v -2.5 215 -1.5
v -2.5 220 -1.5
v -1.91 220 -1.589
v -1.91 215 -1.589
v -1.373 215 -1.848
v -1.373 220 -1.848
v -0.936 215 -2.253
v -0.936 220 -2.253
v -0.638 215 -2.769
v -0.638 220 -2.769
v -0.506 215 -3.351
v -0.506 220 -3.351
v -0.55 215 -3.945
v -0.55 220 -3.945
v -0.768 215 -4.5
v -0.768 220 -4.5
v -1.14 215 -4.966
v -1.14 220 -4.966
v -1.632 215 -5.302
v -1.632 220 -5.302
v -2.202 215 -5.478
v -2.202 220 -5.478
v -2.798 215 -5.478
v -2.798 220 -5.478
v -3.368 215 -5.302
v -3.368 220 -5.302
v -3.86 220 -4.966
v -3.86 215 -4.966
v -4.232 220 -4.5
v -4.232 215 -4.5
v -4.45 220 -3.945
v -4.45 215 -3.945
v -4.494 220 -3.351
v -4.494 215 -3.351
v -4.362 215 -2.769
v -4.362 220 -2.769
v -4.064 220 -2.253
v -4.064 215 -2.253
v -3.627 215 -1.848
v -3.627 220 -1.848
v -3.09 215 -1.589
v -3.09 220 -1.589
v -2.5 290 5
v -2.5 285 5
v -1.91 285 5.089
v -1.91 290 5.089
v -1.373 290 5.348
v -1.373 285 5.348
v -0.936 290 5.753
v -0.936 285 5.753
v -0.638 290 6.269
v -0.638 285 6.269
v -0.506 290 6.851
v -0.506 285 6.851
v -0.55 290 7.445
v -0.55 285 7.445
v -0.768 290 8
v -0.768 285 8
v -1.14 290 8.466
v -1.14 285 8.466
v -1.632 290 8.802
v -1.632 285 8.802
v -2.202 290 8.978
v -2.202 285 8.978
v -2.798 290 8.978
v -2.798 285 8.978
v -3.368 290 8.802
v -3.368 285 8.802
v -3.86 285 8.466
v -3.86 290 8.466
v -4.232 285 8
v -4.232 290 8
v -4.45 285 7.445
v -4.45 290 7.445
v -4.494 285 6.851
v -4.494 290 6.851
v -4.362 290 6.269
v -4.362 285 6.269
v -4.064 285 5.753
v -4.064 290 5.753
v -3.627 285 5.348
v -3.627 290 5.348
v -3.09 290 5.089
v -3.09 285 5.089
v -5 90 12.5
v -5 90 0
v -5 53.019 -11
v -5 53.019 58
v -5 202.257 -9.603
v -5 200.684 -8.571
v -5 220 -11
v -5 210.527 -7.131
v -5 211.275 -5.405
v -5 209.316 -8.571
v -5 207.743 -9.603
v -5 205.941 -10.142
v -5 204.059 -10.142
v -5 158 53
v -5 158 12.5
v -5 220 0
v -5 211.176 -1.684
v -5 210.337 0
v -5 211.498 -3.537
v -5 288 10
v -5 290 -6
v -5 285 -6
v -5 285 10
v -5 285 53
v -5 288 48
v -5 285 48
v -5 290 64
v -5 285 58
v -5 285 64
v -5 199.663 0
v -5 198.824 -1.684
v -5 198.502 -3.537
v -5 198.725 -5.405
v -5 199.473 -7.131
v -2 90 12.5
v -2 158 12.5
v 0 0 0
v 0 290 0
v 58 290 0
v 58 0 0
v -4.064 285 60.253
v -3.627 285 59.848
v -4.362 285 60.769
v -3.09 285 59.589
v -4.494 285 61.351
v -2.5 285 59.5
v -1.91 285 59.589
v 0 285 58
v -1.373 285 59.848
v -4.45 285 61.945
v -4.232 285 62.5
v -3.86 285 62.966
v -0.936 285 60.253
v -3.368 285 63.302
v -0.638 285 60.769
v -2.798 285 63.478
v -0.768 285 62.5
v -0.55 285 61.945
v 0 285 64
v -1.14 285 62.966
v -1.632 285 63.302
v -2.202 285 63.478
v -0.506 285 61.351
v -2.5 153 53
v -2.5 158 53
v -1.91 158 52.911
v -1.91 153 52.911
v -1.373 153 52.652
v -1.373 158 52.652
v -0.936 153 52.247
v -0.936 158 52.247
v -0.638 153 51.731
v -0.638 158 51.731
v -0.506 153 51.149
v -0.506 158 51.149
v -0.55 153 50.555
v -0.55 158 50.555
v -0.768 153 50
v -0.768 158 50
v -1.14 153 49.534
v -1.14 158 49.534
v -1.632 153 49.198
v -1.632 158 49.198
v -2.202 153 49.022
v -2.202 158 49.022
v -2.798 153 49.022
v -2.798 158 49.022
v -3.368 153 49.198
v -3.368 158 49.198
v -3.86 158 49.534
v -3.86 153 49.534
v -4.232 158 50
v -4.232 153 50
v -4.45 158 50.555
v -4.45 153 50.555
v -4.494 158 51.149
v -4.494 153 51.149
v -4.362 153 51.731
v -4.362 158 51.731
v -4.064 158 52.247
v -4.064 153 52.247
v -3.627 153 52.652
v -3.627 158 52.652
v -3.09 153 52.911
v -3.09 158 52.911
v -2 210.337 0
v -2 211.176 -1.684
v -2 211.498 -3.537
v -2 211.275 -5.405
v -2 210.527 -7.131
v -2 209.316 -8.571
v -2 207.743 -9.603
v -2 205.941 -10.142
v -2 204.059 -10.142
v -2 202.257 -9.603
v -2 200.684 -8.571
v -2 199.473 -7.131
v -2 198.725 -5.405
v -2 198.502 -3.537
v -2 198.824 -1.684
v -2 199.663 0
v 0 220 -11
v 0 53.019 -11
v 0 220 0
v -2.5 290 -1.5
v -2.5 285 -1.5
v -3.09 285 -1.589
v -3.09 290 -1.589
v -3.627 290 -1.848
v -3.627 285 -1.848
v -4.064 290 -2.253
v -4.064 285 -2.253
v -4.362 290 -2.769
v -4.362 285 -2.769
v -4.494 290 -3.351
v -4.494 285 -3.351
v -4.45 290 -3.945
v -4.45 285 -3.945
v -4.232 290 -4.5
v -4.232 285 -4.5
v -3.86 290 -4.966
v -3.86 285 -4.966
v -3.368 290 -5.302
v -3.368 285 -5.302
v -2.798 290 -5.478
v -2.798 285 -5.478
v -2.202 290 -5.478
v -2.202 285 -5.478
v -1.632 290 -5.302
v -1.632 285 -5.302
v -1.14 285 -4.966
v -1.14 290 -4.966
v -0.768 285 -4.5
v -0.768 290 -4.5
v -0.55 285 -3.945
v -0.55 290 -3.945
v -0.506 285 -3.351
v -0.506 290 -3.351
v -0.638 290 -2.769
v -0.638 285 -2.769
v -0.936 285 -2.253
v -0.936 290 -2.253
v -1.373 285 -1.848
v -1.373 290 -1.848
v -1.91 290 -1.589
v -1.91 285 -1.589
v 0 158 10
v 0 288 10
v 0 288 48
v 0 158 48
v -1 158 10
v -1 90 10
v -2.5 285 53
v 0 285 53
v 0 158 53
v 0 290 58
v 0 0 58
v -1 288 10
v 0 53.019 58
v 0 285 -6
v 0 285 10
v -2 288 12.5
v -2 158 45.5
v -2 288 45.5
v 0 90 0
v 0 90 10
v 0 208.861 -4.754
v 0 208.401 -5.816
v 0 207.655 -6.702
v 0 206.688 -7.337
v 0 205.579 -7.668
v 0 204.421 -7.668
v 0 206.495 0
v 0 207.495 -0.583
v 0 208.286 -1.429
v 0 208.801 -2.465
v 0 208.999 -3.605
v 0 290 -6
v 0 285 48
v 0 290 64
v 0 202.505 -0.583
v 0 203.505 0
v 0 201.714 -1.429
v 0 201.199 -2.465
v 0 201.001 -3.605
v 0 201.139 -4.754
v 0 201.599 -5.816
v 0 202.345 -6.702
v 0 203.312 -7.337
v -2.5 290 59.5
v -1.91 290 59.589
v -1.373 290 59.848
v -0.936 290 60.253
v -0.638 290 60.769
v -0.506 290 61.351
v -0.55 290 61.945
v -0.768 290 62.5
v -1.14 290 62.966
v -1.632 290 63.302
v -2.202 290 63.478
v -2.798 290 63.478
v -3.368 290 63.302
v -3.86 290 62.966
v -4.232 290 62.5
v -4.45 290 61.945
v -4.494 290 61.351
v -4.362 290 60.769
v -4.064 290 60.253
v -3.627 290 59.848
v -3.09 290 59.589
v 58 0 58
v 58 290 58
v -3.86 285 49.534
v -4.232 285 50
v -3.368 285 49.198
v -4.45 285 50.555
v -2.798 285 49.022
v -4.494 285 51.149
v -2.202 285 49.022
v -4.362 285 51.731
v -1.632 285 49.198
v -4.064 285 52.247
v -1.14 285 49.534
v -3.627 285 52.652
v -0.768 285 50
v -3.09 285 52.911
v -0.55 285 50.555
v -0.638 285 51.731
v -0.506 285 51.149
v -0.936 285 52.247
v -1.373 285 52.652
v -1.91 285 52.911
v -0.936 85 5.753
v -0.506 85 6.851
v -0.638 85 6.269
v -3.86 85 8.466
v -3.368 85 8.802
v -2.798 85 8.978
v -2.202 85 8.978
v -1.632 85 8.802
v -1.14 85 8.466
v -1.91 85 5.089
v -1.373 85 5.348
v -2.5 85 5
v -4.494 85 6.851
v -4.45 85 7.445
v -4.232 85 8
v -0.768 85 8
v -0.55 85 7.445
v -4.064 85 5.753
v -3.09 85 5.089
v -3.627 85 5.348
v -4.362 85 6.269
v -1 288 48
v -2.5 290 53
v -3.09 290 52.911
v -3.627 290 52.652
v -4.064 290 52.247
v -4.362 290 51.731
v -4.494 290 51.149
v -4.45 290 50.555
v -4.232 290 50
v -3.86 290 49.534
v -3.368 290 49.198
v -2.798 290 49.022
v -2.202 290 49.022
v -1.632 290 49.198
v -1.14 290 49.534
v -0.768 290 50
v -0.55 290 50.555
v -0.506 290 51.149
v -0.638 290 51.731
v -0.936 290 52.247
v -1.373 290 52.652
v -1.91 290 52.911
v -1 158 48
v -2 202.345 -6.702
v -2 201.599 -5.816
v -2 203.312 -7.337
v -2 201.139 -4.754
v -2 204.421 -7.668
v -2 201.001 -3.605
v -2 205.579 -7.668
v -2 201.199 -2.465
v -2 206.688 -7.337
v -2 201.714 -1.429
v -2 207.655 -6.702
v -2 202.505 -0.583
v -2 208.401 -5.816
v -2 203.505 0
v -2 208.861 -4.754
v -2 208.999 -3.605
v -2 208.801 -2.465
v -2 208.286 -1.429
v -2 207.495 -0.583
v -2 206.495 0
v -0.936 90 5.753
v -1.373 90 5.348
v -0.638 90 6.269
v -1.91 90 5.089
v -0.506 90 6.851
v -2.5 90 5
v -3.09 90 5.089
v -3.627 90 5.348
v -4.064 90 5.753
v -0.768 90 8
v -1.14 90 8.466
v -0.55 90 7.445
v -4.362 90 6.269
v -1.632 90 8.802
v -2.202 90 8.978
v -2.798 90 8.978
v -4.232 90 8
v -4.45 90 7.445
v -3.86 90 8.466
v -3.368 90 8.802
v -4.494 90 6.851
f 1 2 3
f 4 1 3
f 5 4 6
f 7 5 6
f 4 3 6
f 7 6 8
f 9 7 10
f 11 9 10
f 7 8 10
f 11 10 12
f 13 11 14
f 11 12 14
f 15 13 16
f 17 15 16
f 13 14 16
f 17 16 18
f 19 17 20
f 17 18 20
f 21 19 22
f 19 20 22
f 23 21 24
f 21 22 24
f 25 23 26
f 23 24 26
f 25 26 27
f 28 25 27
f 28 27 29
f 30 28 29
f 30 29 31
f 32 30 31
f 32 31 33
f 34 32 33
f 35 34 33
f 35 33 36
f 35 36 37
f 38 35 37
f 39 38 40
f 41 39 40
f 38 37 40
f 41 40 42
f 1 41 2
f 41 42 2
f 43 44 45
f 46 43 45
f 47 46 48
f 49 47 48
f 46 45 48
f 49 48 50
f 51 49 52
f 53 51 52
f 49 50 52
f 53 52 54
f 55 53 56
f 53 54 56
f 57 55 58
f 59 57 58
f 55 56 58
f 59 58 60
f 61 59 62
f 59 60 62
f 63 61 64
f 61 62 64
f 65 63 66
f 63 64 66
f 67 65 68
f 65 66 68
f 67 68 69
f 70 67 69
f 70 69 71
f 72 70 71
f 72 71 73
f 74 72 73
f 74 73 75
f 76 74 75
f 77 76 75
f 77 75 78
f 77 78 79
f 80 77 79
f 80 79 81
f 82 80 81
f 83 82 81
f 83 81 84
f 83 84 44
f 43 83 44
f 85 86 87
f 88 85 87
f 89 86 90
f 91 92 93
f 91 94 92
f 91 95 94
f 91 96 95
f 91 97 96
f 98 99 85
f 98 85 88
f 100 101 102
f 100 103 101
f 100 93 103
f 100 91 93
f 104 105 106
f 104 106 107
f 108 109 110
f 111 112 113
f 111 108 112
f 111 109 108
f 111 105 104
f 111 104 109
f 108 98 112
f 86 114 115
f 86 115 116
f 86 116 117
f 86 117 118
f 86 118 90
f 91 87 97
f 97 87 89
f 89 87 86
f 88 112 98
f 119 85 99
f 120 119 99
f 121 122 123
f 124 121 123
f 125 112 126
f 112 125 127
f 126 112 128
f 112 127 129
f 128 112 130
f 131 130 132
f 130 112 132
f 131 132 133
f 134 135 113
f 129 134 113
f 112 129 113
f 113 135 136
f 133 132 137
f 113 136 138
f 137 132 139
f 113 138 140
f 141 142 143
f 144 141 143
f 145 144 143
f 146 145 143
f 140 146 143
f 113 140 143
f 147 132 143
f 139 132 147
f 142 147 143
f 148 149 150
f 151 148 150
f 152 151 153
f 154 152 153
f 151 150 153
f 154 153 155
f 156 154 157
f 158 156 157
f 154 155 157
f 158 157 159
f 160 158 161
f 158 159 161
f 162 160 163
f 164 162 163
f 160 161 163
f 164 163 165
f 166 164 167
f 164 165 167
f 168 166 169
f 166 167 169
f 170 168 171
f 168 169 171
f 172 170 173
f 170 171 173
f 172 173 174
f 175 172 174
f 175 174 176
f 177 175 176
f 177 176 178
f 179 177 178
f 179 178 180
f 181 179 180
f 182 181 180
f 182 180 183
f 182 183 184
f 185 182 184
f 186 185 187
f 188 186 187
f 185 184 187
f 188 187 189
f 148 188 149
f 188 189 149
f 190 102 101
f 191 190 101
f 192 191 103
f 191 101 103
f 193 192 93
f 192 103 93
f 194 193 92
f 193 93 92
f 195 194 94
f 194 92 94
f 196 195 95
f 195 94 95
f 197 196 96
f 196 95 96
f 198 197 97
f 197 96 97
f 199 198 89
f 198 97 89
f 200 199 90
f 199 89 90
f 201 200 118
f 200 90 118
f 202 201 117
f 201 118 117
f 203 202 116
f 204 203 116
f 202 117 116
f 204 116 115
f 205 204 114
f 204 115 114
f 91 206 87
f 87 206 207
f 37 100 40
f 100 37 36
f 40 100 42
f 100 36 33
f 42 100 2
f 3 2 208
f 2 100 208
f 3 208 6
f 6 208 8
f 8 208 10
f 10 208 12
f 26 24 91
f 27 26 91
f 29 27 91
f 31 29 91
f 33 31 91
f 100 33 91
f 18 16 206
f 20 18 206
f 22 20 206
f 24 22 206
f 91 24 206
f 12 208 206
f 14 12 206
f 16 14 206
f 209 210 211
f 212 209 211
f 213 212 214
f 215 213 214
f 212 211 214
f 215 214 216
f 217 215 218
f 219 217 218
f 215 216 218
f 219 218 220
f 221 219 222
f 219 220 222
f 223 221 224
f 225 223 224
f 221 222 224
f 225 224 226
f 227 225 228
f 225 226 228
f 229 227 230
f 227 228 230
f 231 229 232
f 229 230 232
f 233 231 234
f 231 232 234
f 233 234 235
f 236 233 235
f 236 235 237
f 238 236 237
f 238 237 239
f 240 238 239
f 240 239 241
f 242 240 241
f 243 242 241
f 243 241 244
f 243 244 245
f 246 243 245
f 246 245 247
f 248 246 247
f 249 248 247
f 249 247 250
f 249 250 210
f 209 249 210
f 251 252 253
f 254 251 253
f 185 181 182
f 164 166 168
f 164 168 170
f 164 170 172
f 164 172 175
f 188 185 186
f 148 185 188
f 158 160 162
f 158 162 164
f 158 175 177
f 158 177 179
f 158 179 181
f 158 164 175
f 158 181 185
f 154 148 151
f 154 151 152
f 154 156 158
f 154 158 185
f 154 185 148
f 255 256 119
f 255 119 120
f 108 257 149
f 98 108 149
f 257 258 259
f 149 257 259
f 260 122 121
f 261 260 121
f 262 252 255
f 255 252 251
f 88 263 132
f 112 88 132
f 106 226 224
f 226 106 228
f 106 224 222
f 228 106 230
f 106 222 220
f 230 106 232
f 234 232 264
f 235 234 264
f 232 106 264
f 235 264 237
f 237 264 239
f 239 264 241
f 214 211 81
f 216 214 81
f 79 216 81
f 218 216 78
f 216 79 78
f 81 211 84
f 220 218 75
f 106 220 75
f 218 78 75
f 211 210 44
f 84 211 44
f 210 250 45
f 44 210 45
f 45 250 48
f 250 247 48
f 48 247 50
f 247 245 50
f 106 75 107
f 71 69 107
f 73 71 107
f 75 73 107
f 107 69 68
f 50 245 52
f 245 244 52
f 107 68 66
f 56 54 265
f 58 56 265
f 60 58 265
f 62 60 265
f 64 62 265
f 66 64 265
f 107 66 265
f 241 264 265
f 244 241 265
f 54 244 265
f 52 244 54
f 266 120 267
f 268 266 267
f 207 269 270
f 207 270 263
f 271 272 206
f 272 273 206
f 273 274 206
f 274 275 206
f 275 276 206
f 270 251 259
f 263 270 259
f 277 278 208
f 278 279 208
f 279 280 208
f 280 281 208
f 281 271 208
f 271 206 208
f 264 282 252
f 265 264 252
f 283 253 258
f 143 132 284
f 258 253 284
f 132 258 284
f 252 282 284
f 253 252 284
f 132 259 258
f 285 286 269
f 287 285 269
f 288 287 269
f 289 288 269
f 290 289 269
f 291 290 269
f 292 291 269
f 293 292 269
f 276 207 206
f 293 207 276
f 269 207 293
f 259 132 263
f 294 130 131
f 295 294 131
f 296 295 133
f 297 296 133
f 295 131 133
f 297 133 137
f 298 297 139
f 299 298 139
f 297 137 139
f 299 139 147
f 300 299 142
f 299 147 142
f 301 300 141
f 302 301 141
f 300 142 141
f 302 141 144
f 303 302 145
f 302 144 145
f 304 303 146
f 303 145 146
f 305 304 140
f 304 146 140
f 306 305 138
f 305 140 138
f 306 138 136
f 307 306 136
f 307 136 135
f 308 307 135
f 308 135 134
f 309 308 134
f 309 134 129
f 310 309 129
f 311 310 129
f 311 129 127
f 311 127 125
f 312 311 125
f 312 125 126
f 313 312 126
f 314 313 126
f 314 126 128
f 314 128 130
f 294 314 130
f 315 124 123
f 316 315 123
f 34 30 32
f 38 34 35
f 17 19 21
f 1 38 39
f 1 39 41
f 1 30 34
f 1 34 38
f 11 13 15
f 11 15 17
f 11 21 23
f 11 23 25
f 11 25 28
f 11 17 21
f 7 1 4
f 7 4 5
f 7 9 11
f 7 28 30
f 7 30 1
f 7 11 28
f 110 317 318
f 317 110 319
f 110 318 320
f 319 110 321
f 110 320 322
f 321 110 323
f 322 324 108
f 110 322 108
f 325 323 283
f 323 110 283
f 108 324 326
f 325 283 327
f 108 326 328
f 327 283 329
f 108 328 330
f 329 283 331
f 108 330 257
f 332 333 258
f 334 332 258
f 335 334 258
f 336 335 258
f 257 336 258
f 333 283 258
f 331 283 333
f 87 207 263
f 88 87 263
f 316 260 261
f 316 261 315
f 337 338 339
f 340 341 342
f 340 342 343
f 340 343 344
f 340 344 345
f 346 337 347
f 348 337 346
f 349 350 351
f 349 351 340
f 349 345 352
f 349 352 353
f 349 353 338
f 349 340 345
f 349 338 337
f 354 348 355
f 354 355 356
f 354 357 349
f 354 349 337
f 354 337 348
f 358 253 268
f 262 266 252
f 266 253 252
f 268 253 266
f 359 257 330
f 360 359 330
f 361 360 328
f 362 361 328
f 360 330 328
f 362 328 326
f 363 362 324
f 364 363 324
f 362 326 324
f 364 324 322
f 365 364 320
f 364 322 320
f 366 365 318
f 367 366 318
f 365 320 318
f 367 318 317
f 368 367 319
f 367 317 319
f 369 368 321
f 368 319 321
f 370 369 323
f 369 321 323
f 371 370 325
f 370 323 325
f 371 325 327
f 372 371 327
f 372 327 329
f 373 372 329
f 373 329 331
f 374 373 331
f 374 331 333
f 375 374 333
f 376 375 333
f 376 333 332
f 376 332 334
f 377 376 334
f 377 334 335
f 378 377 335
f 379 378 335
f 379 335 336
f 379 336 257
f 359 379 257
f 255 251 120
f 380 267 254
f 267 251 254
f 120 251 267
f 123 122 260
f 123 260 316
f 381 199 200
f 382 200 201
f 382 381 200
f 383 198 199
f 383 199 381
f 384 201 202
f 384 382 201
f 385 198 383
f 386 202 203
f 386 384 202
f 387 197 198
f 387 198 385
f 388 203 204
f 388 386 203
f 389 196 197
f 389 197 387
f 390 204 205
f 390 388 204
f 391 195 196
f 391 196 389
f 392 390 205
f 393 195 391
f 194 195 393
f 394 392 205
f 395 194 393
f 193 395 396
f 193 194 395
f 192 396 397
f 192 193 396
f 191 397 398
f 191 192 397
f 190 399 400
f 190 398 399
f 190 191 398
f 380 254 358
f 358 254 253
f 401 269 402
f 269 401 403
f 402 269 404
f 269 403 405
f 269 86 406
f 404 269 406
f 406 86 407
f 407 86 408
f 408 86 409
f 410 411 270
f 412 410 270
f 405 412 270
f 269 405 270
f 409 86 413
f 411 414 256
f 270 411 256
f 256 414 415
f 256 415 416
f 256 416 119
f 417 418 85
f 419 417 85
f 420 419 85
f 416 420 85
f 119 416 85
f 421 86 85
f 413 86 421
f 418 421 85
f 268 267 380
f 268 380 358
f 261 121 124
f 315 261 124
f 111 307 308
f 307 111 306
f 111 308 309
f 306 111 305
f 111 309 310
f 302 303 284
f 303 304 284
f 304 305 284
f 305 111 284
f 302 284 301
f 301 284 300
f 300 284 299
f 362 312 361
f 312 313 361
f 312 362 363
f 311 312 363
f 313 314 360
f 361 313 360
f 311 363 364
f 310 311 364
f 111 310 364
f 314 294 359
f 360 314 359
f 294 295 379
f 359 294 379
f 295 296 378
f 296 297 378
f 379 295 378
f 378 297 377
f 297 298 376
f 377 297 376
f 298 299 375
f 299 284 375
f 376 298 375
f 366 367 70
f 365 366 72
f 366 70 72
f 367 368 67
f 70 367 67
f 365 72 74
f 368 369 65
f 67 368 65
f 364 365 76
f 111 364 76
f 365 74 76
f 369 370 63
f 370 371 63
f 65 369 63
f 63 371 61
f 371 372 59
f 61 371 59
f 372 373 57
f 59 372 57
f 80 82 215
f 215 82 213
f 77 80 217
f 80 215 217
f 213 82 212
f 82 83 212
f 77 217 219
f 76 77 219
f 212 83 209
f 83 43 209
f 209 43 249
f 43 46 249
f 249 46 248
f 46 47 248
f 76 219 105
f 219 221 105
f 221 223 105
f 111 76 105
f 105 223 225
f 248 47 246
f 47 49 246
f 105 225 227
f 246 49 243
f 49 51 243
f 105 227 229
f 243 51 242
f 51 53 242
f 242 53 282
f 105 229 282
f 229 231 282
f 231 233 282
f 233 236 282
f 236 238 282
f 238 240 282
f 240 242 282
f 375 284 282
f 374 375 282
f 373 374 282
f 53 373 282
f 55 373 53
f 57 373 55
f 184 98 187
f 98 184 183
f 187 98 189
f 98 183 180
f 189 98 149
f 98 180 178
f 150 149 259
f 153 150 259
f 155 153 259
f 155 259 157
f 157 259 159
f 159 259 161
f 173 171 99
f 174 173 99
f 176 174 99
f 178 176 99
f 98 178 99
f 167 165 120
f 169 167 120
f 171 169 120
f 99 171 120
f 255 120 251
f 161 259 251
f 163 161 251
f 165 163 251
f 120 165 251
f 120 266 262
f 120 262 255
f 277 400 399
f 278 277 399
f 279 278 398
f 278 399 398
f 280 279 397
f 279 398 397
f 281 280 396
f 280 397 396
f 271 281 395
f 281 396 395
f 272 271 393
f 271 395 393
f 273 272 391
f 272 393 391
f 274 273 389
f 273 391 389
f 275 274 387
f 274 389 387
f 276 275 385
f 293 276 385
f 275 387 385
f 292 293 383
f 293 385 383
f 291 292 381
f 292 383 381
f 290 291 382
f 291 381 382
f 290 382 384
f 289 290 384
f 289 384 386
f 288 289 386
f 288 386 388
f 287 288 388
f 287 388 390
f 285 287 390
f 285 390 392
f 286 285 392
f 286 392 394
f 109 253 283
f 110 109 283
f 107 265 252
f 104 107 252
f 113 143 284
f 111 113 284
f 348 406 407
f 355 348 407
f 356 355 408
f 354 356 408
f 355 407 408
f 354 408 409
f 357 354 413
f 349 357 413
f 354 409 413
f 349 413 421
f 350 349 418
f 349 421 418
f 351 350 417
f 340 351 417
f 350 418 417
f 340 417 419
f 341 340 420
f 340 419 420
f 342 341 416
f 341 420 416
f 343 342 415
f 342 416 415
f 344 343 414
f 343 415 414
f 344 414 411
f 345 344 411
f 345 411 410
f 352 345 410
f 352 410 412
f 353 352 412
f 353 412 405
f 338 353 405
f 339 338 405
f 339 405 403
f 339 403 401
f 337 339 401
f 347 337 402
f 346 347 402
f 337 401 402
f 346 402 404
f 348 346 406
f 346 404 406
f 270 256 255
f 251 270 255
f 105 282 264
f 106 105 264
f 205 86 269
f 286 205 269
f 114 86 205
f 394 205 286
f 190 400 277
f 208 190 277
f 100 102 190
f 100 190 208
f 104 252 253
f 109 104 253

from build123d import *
from OCP.BRepFilletAPI import BRepFilletAPI_MakeChamfer

# Parameters (mm, degrees)
ESQUISSE1_W              = 58
ESQUISSE1_H              = 58
BOSS_EXTRU_2_DEPTH       = 58
BOSS_EXTRU_3_DEPTH       = 5
BOSS_EXTRU_4_DEPTH       = 2
ESQUISSE11_R             = 2
ENL_V_MAT_EXTRU_18_DEPTH = 5
ESQUISSE12_R             = 2
ENL_V_MAT_EXTRU_19_DEPTH = 5
ESQUISSE13_R             = 2
ENL_V_MAT_EXTRU_20_DEPTH = 298.800268637
ESQUISSE14_W             = 10
ESQUISSE14_H             = 195
ENL_V_MAT_EXTRU_21_DEPTH = 3
ESQUISSE15_W             = 7.5
ESQUISSE15_H             = 195
ENL_V_MAT_EXTRU_22_DEPTH = 303.978547095
CHANFREIN3_SIZE          = 1
CHANFREIN3_SIZE2         = 2.5
CHANFREIN4_SIZE2         = 1
CHANFREIN4_SIZE          = 2.5
ESQUISSE16_R             = 2
ENL_V_MAT_EXTRU_23_DEPTH = 5
ESQUISSE17_W             = 2.5
ESQUISSE17_H             = 195
ENL_V_MAT_EXTRU_24_DEPTH = 304.586890363
ESQUISSE18_R             = 6.5
ESQUISSE18_R_2           = 4
ENL_V_MAT_EXTRU_25_DEPTH = 3
ENL_V_MAT_EXTRU_26_DEPTH = 304.586890363


with BuildPart() as part:
    # Esquisse1 → Boss.-Extru.2 (new body)
    with BuildSketch(Plane.XY):
        with Locations((29, 261)):
            Rectangle(ESQUISSE1_W, ESQUISSE1_H)
        with Locations((29, 203)):
            Rectangle(ESQUISSE1_W, ESQUISSE1_H)
        with Locations((29, 145)):
            Rectangle(ESQUISSE1_W, ESQUISSE1_H)
        with Locations((29, 87)):
            Rectangle(ESQUISSE1_W, ESQUISSE1_H)
        with Locations((29, 29)):
            Rectangle(ESQUISSE1_W, ESQUISSE1_H)
    extrude(amount=BOSS_EXTRU_2_DEPTH)


with BuildPart() as body_2:
    # Esquisse3 → Boss.-Extru.3 (new body)
    with BuildSketch(Plane.ZY):
        Polygon((64, 290), (-6, 290), (-6, 285), (0, 285), (0, 220), (-11, 220), (-11, 53.018562931), (58, 53.018562931), (58, 285), (64, 285), align=None)
        Polygon((53, 285), (53, 158), (5, 158), (5, 285), (10, 285), (10, 288), (48, 288), (48, 285), align=None, mode=Mode.SUBTRACT)
    extrude(amount=BOSS_EXTRU_3_DEPTH)

    # Esquisse11 → Enlèv. mat.-Extru.18 (cut)
    with BuildSketch(Plane(origin=(0, 158, 0), x_dir=(1, 0, 0), z_dir=(0, 1, 0))):
        with Locations(Location((-2.5, -51, 0), (0, 0, 270))):
            Circle(ESQUISSE11_R)
    extrude(amount=-ENL_V_MAT_EXTRU_18_DEPTH, mode=Mode.SUBTRACT)

    # Esquisse12 → Enlèv. mat.-Extru.19 (cut)
    with BuildSketch(Plane(origin=(0, 220, 0), x_dir=(1, 0, 0), z_dir=(0, 1, 0))):
        with Locations(Location((-2.5, 3.5, 0), (0, 0, 270))):
            Circle(ESQUISSE12_R)
    extrude(amount=-ENL_V_MAT_EXTRU_19_DEPTH, mode=Mode.SUBTRACT)

    # Esquisse13 → Enlèv. mat.-Extru.20 (cut, through all)
    with BuildSketch(Plane(origin=(0, 285, 0), x_dir=(-1, 0, 0), z_dir=(0, -1, 0))):
        with Locations(Location((2.5, -7, 0), (0, 0, 90))):
            Circle(ESQUISSE13_R)
        with Locations(Location((2.5, 3.5, 0), (0, 0, 270))):
            Circle(ESQUISSE13_R)
        with Locations(Location((2.5, -61.5, 0), (0, 0, 90))):
            Circle(ESQUISSE13_R)
        with Locations(Location((2.5, -51, 0), (0, 0, 270))):
            Circle(ESQUISSE13_R)
    extrude(amount=-ENL_V_MAT_EXTRU_20_DEPTH, mode=Mode.SUBTRACT)

    # Esquisse14 → Enlèv. mat.-Extru.21 (cut)
    with BuildSketch(Plane.ZY.offset(5)):
        with Locations((7.5, 187.5)):
            Rectangle(ESQUISSE14_W, ESQUISSE14_H)
    extrude(amount=-ENL_V_MAT_EXTRU_21_DEPTH, mode=Mode.SUBTRACT)

    # Esquisse15 → Enlèv. mat.-Extru.22 (cut, through all)
    with BuildSketch(Plane.ZY.offset(2)):
        with Locations((6.25, 187.5)):
            Rectangle(ESQUISSE15_W, ESQUISSE15_H)
    extrude(amount=-ENL_V_MAT_EXTRU_22_DEPTH, mode=Mode.SUBTRACT)

    # Chanfrein4
    chanfrein4_edges = [body_2.edges().sort_by_distance(p)[0] for p in [
        (-2, 124, 10),
    ]]
    chanfrein4_side = [body_2.faces().sort_by_distance(p)[0] for p in [
        (-2, 124, 10.02),
    ]]
    chamfer(chanfrein4_edges, length=CHANFREIN4_SIZE - 0.0001, length2=CHANFREIN4_SIZE2 - 0.0001, reference=chanfrein4_side[0])  # a hair under: the kernel refuses the full size

    # Esquisse16 → Enlèv. mat.-Extru.23 (cut)
    with BuildSketch(Plane(origin=(0, 90, 0), x_dir=(1, 0, 0), z_dir=(0, 1, 0))):
        with Locations(Location((-2.5, -7, 0), (0, 0, 90))):
            Circle(ESQUISSE16_R)
    extrude(amount=-ENL_V_MAT_EXTRU_23_DEPTH, mode=Mode.SUBTRACT)

    # Esquisse17 → Enlèv. mat.-Extru.24 (cut, through all)
    with BuildSketch(Plane.ZY.offset(5)):
        with Locations((1.25, 187.5)):
            Rectangle(ESQUISSE17_W, ESQUISSE17_H)
    extrude(amount=-ENL_V_MAT_EXTRU_24_DEPTH, mode=Mode.SUBTRACT)

    # Esquisse18 → Enlèv. mat.-Extru.25 (cut)
    with BuildSketch(Plane.ZY.offset(5)):
        with Locations((-3.71, 205)):
            Circle(ESQUISSE18_R)
        with Locations((-3.71, 205)):
            Circle(ESQUISSE18_R_2, mode=Mode.SUBTRACT)
    extrude(amount=-ENL_V_MAT_EXTRU_25_DEPTH, mode=Mode.SUBTRACT)

    # Esquisse18<2> → Enlèv. mat.-Extru.26 (cut, through all)
    with BuildSketch(Plane.ZY.offset(5)):
        with BuildLine():
            Line((0, 203.504707386), (0, 206.495292614))
            ThreePointArc((0, 206.495292614), (-7.71, 205), (0, 203.504707386))
        make_face()
        with BuildLine():
            ThreePointArc((0.29, 205), (0.216830783, 205.761577311), (0, 206.495292614))
            Line((0, 206.495292614), (0, 203.504707386))
            ThreePointArc((0, 203.504707386), (0.216830783, 204.238422689), (0.29, 205))
        make_face()
    extrude(amount=-ENL_V_MAT_EXTRU_26_DEPTH, mode=Mode.SUBTRACT)


with BuildPart() as body_3:
    # Esquisse3<3> → Boss.-Extru.4 (new body)
    with BuildSketch(Plane.ZY):
        Polygon((48, 158), (48, 285), (48, 288), (10, 288), (10, 285), (10, 158), align=None)
    extrude(amount=BOSS_EXTRU_4_DEPTH)

    # Chanfrein3: one chamfer whose edges measure the first distance from different faces: ONE call of the kernel's chamfer builder (chamfer() names one face for all edges)
    chanfrein3_edges_1 = [body_3.edges().sort_by_distance(p)[0] for p in [
        (-2, 223, 48),
    ]]
    chanfrein3_side_1 = [body_3.faces().sort_by_distance(p)[0] for p in [
        (-1, 223, 48),
    ]]
    chanfrein3_edges_2 = [body_3.edges().sort_by_distance(p)[0] for p in [
        (-2, 223, 10),
    ]]
    chanfrein3_side_2 = [body_3.faces().sort_by_distance(p)[0] for p in [
        (-1, 223, 10),
    ]]
    chanfrein3 = BRepFilletAPI_MakeChamfer(body_3.part.solid().wrapped)
    for e in chanfrein3_edges_1:
        chanfrein3.Add(CHANFREIN3_SIZE, CHANFREIN3_SIZE2, e.wrapped, chanfrein3_side_1[0].wrapped)  # the first distance lies on this face
    for e in chanfrein3_edges_2:
        chanfrein3.Add(CHANFREIN3_SIZE, CHANFREIN3_SIZE2, e.wrapped, chanfrein3_side_2[0].wrapped)  # the first distance lies on this face
    add(Compound.cast(chanfrein3.Shape()), mode=Mode.REPLACE)


solid = Compound([part.part, body_2.part, body_3.part])
